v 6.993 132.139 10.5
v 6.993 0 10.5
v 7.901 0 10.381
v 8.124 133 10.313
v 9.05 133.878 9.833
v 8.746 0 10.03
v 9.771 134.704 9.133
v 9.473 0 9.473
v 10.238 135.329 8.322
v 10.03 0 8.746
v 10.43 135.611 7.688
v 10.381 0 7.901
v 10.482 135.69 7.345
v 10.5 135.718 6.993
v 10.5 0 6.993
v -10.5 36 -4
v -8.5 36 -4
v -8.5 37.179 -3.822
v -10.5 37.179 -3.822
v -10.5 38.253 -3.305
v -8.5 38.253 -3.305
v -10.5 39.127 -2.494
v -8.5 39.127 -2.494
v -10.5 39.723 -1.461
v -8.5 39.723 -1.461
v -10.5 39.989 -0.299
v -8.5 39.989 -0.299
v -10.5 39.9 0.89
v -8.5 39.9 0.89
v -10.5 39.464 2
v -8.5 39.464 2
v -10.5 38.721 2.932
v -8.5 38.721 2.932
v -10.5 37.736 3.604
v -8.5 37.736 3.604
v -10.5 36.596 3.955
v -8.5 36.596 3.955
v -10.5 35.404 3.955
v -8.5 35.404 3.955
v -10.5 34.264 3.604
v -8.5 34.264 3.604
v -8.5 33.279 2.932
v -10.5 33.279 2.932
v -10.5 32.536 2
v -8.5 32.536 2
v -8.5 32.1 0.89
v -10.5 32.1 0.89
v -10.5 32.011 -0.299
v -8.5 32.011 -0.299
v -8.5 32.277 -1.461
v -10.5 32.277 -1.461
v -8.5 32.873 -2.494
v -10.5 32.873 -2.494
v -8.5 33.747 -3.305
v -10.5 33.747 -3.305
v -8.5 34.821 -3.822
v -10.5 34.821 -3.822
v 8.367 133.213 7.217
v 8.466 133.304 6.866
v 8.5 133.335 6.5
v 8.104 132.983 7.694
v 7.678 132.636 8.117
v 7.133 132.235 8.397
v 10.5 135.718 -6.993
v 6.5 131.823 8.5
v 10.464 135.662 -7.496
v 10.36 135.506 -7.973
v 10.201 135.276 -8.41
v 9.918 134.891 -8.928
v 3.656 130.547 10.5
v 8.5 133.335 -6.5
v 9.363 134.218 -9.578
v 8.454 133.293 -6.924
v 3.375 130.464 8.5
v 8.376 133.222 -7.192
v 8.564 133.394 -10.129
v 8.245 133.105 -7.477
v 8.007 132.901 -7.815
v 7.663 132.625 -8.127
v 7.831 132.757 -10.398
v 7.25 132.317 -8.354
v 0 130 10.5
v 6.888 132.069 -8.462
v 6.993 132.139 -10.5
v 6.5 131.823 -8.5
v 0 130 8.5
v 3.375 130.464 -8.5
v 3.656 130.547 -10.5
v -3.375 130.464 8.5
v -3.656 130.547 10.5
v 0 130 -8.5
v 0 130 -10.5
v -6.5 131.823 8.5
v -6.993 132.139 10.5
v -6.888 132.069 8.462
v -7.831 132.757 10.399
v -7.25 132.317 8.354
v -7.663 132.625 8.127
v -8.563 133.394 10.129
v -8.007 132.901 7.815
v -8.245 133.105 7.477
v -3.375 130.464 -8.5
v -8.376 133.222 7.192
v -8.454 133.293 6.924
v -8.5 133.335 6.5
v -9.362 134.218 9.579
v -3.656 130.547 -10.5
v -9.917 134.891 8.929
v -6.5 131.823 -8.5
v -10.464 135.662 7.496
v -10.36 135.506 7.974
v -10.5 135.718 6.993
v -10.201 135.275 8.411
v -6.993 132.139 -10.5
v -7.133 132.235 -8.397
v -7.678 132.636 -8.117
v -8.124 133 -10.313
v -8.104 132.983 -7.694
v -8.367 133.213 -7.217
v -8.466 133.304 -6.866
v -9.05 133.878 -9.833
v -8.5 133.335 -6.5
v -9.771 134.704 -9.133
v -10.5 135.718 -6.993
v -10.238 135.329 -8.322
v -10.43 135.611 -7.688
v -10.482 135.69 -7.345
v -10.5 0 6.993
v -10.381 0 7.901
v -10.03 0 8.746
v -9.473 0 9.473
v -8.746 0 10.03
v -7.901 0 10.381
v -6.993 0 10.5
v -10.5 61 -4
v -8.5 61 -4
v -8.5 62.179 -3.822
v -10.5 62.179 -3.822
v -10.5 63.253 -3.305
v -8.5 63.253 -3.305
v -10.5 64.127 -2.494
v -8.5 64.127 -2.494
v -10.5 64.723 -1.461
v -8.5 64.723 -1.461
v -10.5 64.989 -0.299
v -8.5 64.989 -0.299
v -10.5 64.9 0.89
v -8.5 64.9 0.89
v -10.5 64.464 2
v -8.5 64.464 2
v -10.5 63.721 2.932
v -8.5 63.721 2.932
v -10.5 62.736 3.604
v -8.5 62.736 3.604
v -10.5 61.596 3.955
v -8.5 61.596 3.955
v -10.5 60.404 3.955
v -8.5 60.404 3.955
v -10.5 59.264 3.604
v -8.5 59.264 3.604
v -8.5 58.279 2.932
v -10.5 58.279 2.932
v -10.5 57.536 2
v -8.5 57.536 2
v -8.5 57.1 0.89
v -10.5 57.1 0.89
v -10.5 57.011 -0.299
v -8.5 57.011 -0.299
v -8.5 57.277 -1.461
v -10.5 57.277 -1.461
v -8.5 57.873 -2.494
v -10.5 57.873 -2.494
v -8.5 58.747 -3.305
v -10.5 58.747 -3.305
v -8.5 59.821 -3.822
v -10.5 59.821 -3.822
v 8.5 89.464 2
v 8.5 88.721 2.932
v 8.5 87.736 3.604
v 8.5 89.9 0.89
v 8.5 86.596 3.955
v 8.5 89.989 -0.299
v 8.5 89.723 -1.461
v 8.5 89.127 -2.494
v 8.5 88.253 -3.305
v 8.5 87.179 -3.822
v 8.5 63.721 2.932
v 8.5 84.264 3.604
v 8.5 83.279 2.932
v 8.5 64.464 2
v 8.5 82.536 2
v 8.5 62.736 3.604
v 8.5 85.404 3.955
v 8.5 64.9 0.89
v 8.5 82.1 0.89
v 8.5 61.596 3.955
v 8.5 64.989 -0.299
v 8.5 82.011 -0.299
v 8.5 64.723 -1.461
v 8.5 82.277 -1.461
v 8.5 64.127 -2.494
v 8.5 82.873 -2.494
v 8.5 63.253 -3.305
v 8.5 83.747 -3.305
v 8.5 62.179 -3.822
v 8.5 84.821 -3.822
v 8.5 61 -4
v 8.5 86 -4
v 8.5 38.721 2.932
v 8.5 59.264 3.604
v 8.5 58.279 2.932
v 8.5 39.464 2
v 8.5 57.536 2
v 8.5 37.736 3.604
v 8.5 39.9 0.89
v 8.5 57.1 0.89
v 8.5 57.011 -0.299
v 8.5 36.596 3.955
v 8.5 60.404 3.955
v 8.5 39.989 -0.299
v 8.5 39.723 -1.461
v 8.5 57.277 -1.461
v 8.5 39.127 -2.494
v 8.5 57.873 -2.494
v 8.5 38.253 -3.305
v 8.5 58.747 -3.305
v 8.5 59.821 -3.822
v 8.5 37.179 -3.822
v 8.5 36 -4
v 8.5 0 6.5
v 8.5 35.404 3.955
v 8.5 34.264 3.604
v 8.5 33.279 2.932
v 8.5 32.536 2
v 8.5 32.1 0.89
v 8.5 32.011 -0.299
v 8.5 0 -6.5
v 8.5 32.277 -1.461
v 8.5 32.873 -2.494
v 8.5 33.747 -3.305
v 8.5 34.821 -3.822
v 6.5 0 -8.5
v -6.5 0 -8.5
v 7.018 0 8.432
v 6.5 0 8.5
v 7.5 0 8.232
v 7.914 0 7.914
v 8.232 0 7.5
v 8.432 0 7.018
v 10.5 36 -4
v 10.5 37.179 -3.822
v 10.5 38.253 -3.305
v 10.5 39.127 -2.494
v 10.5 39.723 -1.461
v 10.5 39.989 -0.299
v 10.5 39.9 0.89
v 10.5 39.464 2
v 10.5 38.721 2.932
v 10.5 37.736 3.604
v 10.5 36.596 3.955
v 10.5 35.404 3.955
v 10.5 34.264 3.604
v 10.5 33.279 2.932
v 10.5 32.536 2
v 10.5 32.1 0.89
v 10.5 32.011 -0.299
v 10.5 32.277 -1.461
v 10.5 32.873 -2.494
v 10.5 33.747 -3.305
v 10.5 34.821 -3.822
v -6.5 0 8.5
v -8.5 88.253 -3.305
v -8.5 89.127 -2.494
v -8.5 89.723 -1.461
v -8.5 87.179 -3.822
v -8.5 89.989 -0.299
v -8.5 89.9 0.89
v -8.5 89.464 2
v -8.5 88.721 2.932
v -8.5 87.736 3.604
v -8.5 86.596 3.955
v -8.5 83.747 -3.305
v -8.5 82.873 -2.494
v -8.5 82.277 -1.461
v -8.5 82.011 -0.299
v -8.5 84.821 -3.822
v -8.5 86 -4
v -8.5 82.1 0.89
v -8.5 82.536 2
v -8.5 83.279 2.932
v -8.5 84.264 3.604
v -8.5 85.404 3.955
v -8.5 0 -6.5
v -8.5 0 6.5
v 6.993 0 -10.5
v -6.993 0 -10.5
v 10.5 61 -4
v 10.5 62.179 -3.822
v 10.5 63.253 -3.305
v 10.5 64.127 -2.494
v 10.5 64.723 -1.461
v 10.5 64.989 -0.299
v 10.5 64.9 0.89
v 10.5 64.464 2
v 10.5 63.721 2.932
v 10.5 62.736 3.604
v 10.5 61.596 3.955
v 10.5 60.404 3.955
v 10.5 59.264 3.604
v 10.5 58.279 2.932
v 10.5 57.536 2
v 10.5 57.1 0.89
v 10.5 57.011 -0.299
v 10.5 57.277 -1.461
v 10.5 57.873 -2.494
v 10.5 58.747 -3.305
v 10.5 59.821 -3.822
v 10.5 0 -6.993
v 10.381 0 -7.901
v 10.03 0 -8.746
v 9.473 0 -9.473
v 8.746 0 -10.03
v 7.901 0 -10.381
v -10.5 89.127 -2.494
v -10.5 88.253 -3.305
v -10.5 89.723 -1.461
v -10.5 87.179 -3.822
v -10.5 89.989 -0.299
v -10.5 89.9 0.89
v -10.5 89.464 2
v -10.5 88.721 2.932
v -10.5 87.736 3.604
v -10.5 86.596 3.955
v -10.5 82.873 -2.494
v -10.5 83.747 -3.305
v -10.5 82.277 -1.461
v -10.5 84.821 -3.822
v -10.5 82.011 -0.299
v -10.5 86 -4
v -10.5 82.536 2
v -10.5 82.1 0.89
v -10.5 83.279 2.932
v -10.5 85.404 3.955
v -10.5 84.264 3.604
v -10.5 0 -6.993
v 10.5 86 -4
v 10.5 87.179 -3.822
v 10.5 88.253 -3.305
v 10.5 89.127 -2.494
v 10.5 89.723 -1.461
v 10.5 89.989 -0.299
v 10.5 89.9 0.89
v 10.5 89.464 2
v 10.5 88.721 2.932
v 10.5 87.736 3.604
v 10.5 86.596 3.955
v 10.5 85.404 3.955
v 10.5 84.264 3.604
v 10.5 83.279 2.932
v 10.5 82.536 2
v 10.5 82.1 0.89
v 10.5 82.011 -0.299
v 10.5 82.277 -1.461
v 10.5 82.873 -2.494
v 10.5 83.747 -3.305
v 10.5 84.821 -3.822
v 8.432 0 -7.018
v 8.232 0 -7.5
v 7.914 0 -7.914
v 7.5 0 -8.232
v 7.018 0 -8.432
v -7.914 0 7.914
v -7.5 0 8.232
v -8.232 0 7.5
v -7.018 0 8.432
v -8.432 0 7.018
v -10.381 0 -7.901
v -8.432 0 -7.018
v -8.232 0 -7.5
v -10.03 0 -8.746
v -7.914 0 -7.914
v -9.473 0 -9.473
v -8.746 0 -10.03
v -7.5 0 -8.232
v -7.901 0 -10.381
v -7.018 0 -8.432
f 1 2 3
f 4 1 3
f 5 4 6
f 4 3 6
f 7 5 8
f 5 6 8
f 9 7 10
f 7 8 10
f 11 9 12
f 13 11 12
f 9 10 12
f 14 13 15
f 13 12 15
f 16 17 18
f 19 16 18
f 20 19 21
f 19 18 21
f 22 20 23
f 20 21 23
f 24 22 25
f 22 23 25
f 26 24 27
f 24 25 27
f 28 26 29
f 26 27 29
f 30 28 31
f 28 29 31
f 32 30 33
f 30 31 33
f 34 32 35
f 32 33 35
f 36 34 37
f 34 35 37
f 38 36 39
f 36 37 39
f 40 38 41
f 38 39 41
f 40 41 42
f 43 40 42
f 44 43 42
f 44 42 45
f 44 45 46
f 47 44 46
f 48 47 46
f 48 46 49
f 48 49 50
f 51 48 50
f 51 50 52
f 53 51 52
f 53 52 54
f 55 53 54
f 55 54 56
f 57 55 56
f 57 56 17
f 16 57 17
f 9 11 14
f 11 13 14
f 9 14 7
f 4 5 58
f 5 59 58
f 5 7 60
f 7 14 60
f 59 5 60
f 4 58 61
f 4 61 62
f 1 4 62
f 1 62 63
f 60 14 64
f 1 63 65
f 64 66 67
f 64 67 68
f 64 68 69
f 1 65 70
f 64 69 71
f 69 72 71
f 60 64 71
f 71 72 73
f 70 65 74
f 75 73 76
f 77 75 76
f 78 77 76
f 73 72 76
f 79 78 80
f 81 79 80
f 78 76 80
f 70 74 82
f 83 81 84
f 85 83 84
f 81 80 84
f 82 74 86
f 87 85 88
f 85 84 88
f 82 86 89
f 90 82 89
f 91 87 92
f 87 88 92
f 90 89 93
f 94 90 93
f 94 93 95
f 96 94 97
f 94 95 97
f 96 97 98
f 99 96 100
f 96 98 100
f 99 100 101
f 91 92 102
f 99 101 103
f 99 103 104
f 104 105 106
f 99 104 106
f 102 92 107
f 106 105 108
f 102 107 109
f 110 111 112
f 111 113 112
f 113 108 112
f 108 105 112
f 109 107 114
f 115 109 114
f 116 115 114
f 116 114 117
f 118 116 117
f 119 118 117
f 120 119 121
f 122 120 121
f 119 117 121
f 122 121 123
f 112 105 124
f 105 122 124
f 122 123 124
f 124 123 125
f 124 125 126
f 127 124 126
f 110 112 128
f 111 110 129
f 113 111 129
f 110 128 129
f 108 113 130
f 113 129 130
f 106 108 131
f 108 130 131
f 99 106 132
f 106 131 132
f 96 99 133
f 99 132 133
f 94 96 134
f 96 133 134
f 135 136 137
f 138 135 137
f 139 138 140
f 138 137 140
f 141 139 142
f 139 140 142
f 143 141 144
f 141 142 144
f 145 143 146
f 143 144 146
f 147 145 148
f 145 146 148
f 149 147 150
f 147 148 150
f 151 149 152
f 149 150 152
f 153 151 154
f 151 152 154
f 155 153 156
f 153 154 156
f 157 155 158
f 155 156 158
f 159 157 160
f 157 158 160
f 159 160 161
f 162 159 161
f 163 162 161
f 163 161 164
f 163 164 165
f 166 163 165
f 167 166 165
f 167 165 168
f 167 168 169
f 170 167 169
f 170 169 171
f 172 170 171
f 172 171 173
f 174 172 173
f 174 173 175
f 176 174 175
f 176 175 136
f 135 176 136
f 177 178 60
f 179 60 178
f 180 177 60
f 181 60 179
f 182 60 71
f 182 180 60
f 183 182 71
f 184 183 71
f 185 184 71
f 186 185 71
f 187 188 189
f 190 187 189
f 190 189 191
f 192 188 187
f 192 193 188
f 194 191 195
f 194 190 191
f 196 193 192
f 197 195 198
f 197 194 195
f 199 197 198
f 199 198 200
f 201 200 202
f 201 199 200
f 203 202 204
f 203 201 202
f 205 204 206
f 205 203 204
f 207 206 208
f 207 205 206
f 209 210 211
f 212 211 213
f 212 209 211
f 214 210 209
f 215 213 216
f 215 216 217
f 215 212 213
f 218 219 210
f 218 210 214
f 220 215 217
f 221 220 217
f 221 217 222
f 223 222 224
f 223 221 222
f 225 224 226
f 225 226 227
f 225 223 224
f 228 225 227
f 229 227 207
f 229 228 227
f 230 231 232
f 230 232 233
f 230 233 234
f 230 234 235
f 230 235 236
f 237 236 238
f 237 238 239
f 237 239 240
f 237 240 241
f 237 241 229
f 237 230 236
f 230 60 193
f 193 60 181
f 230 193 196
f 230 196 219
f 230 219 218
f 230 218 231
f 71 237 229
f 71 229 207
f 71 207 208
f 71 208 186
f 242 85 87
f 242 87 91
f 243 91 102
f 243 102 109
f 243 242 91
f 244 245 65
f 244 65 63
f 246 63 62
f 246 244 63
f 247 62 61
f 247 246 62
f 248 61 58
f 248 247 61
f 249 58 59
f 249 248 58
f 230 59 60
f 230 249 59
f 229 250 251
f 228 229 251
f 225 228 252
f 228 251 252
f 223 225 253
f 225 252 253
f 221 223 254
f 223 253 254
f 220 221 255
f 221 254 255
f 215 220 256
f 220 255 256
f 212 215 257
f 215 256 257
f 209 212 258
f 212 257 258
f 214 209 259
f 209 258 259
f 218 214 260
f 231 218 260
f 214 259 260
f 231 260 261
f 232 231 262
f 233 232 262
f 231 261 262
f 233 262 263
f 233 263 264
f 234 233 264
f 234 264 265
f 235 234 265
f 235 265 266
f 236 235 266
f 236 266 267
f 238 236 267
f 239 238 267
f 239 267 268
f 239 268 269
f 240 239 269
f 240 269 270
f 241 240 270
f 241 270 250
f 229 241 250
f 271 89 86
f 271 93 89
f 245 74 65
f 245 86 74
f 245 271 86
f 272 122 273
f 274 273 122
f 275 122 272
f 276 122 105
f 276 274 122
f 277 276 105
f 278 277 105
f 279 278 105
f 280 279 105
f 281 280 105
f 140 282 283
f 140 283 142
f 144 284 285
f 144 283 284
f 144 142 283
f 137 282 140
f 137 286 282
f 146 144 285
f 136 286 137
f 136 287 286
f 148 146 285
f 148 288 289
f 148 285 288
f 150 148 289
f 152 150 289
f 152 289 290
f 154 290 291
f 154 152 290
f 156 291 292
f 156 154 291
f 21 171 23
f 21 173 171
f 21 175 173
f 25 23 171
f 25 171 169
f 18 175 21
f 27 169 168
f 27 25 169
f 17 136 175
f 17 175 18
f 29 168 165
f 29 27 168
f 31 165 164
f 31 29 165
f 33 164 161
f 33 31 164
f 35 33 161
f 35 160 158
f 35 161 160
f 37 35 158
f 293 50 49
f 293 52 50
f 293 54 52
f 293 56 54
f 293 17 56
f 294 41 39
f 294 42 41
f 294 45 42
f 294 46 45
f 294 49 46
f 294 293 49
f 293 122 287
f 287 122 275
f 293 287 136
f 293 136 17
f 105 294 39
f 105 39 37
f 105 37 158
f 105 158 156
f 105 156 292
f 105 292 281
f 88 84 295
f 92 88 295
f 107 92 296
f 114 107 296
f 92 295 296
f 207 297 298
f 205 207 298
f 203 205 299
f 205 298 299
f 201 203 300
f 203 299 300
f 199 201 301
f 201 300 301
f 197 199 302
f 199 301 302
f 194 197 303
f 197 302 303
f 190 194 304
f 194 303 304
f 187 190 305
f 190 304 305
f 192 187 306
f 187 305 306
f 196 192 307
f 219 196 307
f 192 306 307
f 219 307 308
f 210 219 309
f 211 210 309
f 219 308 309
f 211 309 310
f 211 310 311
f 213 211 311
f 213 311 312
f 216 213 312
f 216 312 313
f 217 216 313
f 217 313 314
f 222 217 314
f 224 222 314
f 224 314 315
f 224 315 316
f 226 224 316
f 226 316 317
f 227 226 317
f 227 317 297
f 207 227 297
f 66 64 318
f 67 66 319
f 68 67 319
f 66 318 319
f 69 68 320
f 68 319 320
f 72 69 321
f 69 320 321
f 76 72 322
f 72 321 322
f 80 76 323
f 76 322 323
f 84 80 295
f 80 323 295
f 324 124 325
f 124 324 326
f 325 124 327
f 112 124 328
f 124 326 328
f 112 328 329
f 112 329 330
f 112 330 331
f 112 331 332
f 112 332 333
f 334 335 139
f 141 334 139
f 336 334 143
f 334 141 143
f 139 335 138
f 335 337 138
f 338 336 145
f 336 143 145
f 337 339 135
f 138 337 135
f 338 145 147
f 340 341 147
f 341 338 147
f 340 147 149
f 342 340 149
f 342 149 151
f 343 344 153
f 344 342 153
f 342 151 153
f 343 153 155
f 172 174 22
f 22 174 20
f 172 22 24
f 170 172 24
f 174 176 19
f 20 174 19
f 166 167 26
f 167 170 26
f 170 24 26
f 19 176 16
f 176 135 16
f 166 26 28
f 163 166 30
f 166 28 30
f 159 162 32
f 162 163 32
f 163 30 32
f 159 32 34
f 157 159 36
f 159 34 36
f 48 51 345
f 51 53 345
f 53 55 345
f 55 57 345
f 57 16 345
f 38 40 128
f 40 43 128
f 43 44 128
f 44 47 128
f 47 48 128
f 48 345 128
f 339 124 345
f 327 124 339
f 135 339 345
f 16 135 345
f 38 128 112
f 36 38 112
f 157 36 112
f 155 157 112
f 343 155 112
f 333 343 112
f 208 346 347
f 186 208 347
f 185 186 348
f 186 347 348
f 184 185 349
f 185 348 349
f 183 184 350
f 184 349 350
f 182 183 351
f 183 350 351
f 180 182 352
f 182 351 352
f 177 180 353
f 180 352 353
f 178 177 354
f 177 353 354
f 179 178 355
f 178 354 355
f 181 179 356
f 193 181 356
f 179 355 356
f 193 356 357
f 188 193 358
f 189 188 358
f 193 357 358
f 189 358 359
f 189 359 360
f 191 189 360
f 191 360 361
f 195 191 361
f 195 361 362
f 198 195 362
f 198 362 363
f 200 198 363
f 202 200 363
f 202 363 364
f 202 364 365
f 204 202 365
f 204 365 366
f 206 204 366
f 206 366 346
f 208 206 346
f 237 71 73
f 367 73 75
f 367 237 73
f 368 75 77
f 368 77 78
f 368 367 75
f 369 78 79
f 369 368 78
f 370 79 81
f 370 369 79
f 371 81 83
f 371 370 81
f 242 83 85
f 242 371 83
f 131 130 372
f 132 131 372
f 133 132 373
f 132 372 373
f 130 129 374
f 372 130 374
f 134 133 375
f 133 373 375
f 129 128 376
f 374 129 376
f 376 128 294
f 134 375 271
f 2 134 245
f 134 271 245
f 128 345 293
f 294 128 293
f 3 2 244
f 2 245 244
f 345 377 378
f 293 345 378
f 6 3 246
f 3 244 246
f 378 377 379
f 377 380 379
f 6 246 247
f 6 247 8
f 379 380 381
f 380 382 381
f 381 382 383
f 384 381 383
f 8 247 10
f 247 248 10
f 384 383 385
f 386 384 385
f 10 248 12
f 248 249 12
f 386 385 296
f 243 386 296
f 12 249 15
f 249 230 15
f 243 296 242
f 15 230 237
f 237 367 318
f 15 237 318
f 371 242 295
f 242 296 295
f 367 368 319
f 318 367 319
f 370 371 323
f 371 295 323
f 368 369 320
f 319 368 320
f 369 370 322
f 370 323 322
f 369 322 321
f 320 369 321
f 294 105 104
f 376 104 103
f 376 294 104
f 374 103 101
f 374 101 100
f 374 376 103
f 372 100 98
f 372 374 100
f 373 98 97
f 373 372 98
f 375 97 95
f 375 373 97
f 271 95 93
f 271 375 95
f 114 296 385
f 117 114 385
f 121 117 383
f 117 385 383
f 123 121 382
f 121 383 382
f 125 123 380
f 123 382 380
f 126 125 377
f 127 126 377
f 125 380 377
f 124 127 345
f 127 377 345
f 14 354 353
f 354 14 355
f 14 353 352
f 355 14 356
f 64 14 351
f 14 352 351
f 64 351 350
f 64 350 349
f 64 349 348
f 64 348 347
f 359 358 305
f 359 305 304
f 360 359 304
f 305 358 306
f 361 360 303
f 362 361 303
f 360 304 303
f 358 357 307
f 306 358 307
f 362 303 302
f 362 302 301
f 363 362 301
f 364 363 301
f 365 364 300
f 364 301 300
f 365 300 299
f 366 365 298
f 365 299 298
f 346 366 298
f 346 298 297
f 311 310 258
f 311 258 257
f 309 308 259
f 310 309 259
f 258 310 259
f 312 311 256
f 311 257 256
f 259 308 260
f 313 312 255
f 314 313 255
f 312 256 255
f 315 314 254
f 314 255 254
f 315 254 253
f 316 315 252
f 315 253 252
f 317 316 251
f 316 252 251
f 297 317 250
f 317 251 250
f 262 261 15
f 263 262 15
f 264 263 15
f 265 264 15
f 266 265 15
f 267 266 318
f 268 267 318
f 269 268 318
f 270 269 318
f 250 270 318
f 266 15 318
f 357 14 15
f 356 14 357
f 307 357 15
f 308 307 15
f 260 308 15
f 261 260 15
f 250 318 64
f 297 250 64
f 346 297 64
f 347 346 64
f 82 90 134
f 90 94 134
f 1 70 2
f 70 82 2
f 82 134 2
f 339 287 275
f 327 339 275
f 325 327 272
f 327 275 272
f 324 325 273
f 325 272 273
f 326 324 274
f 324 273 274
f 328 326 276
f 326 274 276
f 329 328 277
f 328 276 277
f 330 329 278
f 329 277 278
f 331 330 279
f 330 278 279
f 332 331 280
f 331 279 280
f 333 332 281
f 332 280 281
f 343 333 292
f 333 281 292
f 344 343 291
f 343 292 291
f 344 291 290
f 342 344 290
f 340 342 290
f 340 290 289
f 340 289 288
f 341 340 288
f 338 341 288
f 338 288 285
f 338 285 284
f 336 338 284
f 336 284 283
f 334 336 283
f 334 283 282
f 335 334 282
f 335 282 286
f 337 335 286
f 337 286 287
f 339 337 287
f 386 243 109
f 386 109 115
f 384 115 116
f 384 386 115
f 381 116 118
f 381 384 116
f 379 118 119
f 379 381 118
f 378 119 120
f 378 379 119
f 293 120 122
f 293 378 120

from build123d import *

# Parameters (mm, degrees)
EXTRUDE_1_DEPTH     = 140
SKETCH_2_R          = 12.5
CUT_EXTRUDE_1_DEPTH = 142.955098535
SKETCH_3_R          = 4
CUT_EXTRUDE_2_DEPTH = 138.73356885


with BuildPart() as part:
    # Эскиз1 → Бобышка-Вытянуть1 (new body)
    with BuildSketch(Plane(origin=(0, 0, 0), x_dir=(1, 0, 0), z_dir=(0, 1, 0))):
        with BuildLine():
            Line((-6.992990841, -10.5), (6.992990841, -10.5))
            ThreePointArc((6.992990841, -10.5), (9.472820799, -9.472820799), (10.5, -6.992990841))
            Line((10.5, -6.992990841), (10.5, 6.992990841))
            ThreePointArc((10.5, 6.992990841), (9.472820799, 9.472820799), (6.992990841, 10.5))
            Line((6.992990841, 10.5), (-6.992990841, 10.5))
            ThreePointArc((-6.992990841, 10.5), (-9.472820799, 9.472820799), (-10.5, 6.992990841))
            Line((-10.5, 6.992990841), (-10.5, -6.992990841))
            ThreePointArc((-10.5, -6.992990841), (-9.472820799, -9.472820799), (-6.992990841, -10.5))
        make_face()
        with BuildLine():
            Line((6.5, 8.5), (-6.5, 8.5))
            ThreePointArc((-6.5, 8.5), (-7.914213562, 7.914213562), (-8.5, 6.5))
            Line((-8.5, 6.5), (-8.5, -6.5))
            ThreePointArc((-8.5, -6.5), (-7.914213562, -7.914213562), (-6.5, -8.5))
            Line((-6.5, -8.5), (6.5, -8.5))
            ThreePointArc((6.5, -8.5), (7.914213562, -7.914213562), (8.5, -6.5))
            Line((8.5, -6.5), (8.5, 6.5))
            ThreePointArc((8.5, 6.5), (7.914213562, 7.914213562), (6.5, 8.5))
        make_face(mode=Mode.SUBTRACT)
    extrude(amount=EXTRUDE_1_DEPTH)

    # Эскиз2 → Вырез-Вытянуть1 (cut, through all)
    with BuildSketch(Plane(origin=(0, 0, -10.5), x_dir=(-1, 0, 0), z_dir=(0, 0, -1))):
        with Locations((0, 142.5)):
            Circle(SKETCH_2_R)
    extrude(amount=-CUT_EXTRUDE_1_DEPTH, mode=Mode.SUBTRACT)

    # Эскиз3 → Вырез-Вытянуть2 (cut, through all)
    with BuildSketch(Plane(origin=(10.5, 0, 0), x_dir=(0, 0, -1), z_dir=(1, 0, 0))):
        with Locations((0, 36)):
            Circle(SKETCH_3_R)
        with Locations((0, 61)):
            Circle(SKETCH_3_R)
        with Locations((0, 86)):
            Circle(SKETCH_3_R)
    extrude(amount=-CUT_EXTRUDE_2_DEPTH, mode=Mode.SUBTRACT)


solid = part.part
